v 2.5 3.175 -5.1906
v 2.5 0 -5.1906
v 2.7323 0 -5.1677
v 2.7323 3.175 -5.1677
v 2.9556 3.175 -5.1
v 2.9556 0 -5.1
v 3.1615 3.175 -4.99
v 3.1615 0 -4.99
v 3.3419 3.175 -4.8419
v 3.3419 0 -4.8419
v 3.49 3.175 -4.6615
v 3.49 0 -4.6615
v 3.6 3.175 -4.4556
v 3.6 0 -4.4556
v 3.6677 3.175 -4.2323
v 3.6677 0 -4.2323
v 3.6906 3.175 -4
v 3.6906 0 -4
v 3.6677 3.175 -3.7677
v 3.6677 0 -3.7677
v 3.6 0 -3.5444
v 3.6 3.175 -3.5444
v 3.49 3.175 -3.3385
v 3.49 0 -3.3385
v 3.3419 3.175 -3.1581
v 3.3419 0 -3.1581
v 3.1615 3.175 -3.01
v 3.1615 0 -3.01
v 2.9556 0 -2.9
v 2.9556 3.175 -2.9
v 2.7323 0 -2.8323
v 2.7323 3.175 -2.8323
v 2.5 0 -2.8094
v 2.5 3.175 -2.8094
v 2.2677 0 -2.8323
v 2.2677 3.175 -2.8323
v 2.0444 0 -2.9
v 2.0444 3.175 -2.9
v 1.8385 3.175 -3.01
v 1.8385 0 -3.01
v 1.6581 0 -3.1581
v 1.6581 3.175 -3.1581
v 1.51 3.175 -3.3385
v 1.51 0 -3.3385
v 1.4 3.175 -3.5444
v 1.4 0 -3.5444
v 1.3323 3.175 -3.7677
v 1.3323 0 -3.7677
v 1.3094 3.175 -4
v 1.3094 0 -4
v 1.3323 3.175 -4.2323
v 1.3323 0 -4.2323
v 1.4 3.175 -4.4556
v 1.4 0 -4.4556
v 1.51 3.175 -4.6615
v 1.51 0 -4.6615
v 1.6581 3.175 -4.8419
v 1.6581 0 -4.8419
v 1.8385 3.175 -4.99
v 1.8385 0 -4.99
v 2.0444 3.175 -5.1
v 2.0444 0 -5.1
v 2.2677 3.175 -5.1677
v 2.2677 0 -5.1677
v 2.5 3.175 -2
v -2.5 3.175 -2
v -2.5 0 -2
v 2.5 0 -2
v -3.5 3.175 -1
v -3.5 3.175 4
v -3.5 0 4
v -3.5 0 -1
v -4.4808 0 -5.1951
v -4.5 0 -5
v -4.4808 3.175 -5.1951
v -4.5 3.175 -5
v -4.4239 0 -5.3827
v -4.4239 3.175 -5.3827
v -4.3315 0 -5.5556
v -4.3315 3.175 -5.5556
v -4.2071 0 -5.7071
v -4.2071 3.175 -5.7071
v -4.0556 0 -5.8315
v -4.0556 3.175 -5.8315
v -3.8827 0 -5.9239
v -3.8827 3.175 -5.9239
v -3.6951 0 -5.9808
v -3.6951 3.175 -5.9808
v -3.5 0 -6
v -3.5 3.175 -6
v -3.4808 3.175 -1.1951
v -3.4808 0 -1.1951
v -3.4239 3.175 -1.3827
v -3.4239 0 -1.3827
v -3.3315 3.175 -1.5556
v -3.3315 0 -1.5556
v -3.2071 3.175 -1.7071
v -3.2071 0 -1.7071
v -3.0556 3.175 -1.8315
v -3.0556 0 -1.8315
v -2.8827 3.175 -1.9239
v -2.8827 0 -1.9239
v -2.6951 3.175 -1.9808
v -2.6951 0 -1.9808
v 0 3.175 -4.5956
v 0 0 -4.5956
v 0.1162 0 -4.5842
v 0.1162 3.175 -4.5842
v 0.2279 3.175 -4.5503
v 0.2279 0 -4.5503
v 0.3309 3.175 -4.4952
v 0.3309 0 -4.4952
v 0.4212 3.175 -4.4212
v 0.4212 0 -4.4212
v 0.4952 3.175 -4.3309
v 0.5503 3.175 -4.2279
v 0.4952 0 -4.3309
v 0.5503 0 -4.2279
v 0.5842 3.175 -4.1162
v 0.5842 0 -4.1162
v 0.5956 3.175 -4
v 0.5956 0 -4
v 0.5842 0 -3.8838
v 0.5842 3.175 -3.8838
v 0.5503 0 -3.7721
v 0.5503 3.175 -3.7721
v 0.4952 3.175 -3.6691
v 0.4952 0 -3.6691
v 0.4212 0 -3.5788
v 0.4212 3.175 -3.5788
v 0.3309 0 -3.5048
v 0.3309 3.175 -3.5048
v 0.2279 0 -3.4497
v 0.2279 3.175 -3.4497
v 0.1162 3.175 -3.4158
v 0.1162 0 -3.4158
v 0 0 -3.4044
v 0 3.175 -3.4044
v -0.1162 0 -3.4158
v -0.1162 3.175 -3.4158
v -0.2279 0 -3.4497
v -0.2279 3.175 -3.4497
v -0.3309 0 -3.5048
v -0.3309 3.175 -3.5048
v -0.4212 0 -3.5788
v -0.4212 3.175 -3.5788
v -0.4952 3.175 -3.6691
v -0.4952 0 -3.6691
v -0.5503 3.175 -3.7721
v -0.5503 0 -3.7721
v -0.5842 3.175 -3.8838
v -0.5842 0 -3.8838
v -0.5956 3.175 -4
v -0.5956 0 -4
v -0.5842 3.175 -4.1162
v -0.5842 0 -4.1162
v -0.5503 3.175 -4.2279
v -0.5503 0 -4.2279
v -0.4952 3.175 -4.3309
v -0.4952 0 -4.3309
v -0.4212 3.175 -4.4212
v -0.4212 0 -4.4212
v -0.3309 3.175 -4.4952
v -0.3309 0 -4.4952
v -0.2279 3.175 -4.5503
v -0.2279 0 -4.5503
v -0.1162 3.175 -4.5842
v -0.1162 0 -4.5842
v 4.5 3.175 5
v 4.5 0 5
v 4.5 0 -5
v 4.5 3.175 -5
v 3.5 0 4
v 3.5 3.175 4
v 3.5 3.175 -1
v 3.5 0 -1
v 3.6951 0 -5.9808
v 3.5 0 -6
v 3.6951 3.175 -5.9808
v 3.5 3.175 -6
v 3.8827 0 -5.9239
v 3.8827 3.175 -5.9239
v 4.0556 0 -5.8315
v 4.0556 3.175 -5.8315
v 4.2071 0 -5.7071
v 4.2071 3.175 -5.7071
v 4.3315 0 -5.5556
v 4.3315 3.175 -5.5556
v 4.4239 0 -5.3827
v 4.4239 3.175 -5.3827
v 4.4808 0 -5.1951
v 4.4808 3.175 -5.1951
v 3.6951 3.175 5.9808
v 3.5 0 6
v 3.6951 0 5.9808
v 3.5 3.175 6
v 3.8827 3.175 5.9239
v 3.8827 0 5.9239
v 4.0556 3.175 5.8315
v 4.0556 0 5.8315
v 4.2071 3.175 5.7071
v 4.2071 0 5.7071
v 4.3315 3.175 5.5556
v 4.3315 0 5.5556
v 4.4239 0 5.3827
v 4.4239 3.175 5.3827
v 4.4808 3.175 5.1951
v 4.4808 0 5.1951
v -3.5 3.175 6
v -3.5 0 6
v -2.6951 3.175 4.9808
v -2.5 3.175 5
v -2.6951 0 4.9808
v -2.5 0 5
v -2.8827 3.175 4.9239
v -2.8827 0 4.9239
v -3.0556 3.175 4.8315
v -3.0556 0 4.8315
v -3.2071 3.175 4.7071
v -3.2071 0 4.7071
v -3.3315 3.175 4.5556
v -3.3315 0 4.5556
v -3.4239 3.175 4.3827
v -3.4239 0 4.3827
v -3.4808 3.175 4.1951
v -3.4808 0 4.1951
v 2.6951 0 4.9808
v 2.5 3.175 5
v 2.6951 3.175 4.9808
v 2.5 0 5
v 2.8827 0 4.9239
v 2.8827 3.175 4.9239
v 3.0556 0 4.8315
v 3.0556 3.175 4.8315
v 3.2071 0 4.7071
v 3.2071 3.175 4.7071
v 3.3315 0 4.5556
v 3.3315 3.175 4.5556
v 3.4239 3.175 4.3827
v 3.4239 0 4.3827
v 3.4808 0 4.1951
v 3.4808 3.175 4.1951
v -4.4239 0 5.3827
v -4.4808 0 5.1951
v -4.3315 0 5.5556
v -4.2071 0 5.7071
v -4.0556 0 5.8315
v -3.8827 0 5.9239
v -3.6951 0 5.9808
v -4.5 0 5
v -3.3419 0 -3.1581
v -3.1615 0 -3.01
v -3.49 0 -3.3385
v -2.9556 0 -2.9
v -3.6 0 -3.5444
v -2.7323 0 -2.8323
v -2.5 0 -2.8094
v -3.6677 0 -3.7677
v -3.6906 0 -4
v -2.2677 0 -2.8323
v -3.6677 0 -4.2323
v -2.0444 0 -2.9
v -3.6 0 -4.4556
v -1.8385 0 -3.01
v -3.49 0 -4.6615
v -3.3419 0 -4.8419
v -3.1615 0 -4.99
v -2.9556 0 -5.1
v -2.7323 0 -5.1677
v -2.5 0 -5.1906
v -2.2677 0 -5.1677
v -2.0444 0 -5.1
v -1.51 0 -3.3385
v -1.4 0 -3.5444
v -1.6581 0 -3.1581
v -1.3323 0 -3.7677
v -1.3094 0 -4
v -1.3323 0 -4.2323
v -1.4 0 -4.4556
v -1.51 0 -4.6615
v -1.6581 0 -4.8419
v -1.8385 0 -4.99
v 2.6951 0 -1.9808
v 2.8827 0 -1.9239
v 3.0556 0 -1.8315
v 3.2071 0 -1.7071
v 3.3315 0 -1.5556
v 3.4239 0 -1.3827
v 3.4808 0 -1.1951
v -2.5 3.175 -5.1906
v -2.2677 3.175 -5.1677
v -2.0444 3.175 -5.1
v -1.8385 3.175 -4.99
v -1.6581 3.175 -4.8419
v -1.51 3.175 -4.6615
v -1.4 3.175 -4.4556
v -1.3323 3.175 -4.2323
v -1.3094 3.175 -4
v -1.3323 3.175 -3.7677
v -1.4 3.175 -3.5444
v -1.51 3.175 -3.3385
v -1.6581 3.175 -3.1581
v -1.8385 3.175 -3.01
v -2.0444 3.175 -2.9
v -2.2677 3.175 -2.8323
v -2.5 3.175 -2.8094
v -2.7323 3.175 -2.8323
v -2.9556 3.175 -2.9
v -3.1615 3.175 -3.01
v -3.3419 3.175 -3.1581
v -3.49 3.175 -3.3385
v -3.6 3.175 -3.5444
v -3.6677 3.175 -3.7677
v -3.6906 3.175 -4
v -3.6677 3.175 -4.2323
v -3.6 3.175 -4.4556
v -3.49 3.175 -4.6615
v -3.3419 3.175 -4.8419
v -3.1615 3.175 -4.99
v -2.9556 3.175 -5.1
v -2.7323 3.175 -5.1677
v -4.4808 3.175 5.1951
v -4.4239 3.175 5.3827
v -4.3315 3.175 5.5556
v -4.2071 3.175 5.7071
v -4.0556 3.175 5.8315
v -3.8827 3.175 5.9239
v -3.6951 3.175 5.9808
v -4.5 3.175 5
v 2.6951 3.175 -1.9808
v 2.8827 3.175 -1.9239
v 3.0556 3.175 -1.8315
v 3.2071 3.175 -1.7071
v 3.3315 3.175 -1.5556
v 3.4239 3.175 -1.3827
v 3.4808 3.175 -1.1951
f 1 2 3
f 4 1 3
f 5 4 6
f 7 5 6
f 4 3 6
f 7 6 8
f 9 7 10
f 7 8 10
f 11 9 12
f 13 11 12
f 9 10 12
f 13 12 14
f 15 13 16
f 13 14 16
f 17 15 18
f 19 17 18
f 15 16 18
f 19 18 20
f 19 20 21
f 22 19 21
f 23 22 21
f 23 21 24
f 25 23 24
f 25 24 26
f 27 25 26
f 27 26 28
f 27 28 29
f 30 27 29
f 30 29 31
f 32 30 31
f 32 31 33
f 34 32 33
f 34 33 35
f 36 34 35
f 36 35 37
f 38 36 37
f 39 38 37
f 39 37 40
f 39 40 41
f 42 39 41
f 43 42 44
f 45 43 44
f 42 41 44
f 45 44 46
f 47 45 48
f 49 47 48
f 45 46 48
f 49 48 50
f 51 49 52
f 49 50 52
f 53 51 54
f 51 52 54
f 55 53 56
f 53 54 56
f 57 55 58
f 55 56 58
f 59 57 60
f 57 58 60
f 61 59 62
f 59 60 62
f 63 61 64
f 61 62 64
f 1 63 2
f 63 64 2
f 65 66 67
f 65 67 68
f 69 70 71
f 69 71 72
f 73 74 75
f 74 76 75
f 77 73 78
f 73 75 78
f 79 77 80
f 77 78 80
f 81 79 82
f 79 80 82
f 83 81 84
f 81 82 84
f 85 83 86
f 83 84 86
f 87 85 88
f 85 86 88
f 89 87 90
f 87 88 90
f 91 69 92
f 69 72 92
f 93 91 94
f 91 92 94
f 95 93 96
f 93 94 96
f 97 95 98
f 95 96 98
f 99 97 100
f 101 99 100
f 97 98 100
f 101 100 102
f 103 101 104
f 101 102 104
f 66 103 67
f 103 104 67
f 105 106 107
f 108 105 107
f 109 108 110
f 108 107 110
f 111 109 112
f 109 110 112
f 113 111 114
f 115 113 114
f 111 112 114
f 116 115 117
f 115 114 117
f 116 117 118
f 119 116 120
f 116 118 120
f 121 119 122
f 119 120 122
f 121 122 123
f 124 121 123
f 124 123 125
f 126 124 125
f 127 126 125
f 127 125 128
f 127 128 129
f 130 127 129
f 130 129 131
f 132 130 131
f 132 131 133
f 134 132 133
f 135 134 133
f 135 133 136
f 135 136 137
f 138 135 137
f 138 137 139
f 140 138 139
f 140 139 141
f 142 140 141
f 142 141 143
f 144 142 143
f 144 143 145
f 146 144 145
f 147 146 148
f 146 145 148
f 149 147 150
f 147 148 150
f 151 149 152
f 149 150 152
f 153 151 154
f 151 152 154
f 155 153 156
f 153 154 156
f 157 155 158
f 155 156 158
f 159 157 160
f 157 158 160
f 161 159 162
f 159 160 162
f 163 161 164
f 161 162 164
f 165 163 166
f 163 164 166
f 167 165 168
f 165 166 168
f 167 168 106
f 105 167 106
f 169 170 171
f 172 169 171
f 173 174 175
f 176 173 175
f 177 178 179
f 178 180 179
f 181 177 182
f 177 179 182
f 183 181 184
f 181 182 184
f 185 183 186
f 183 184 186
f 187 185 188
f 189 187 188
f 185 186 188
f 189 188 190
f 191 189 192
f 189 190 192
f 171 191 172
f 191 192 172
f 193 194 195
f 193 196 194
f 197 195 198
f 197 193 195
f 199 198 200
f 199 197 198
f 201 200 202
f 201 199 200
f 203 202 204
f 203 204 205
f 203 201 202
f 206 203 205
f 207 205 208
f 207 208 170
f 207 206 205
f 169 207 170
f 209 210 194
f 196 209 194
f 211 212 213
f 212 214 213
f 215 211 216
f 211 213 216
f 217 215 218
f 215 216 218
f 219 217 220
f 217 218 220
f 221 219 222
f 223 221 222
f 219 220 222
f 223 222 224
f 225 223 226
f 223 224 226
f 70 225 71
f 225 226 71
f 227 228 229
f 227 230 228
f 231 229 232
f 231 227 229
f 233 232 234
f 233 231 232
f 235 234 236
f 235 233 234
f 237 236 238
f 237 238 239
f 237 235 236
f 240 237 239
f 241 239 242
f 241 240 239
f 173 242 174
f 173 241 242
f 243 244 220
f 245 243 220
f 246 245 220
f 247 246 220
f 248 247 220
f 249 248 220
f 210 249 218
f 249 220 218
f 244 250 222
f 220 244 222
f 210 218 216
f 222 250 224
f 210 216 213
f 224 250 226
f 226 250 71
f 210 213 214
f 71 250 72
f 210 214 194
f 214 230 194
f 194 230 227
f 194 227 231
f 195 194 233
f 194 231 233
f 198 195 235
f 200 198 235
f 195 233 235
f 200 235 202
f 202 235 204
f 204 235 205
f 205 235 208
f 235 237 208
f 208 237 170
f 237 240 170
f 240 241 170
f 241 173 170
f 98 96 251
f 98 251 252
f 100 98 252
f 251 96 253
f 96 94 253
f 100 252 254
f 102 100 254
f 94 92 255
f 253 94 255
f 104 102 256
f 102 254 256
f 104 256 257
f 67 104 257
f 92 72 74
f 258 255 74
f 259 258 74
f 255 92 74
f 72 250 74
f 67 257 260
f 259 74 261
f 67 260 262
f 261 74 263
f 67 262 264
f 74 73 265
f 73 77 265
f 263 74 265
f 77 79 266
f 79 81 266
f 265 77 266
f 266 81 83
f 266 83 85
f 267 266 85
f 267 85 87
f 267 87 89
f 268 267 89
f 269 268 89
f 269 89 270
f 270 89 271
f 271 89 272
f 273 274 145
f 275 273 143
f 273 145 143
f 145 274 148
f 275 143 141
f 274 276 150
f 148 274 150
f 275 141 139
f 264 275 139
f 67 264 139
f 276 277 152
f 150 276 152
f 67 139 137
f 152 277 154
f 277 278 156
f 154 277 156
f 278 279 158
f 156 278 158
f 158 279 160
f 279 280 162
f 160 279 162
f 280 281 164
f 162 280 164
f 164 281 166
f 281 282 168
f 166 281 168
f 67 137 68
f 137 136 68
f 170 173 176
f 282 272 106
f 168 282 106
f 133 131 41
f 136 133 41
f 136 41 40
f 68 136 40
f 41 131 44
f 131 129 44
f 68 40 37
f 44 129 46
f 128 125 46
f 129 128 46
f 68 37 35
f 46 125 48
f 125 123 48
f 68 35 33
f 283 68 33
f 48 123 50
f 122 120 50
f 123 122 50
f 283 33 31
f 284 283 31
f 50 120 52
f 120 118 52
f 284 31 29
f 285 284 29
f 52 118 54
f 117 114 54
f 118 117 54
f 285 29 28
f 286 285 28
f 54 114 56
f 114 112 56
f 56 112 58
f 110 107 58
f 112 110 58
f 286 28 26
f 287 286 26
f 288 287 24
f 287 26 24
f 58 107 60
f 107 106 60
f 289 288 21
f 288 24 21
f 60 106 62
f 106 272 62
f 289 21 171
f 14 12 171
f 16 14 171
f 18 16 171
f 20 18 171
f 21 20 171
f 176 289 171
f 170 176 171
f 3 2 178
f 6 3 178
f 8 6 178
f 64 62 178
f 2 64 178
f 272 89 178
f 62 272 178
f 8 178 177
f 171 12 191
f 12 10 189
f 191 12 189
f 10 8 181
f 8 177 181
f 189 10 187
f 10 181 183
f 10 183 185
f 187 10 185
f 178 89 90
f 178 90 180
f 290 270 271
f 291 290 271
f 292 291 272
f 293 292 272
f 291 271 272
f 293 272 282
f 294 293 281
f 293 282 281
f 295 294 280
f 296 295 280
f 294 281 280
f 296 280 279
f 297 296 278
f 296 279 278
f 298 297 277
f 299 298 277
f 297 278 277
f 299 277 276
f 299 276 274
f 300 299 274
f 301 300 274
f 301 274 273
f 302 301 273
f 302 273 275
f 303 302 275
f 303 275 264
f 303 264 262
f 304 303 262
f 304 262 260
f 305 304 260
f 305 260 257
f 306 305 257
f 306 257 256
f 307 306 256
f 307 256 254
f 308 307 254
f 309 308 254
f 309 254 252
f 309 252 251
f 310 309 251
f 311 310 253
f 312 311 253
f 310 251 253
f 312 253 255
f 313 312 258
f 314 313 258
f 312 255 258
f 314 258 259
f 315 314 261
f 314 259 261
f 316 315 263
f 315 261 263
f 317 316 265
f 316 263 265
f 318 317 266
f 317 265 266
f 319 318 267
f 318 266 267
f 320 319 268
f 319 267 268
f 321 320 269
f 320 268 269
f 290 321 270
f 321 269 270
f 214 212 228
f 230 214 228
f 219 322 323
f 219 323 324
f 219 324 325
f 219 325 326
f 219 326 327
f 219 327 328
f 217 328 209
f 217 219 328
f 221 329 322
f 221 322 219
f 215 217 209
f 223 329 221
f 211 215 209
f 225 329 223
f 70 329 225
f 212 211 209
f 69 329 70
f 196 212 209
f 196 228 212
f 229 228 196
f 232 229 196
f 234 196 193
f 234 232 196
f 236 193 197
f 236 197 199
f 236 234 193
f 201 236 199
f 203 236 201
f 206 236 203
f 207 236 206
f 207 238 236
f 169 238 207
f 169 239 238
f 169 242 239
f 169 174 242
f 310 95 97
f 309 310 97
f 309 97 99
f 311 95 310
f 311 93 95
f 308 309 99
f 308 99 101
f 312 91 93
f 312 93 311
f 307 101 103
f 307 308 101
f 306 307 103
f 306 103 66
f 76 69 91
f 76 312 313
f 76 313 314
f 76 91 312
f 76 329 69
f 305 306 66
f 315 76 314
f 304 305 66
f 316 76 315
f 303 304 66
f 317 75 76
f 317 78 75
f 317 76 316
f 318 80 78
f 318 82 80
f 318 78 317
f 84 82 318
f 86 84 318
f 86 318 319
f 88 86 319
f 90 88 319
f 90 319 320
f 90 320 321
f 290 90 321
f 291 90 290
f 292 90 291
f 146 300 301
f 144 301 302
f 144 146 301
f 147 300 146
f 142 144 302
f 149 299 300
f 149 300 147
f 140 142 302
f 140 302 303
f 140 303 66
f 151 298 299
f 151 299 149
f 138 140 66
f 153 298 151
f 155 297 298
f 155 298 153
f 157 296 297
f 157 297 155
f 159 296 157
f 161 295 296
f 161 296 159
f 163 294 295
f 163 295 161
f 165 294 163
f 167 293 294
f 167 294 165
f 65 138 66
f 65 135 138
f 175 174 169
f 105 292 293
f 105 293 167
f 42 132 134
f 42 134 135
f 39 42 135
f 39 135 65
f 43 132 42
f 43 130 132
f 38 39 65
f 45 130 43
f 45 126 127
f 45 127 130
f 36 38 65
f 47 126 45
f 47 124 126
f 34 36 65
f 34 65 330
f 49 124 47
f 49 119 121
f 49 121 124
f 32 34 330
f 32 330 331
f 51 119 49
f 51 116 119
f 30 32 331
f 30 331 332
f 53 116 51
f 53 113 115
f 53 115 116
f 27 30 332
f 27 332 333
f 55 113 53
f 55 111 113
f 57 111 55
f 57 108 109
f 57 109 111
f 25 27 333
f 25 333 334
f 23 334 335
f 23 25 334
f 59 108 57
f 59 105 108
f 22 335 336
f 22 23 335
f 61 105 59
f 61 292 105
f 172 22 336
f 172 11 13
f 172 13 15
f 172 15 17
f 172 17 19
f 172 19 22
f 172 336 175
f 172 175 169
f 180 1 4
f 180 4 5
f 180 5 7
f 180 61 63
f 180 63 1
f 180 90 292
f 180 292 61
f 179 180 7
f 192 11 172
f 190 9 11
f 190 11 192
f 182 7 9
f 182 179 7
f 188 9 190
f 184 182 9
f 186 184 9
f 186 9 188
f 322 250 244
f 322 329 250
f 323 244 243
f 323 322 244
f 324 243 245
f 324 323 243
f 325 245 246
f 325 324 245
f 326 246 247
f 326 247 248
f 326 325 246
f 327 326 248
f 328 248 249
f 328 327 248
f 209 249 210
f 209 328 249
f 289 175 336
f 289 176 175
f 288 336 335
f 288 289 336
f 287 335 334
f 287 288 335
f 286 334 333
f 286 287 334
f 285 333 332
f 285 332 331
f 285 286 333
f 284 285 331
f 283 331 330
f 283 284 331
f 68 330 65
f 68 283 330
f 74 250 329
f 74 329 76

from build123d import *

# Parameters (mm, degrees)
SKETCH1_W                           = 9
SKETCH1_H                           = 12
EXTRUDE1_DEPTH                      = 3.175
SKETCH2_W                           = 7
SKETCH2_H                           = 7
EXTRUDE2_DEPTH                      = 3.5
F_0_80_TAPPED_HOLE1_D               = 1.19126
F_0_80_TAPPED_HOLE1_DEPTH           = 4
F_0_80_TAPPED_HOLE1_TIP             = 0.357890611
F_3_32_0_09375_DIAMETER_HOLE1_D     = 2.38125
F_3_32_0_09375_DIAMETER_HOLE1_DEPTH = 10
F_3_32_0_09375_DIAMETER_HOLE1_TIP   = 0.715399675
FILLET7_R                           = 1


with BuildPart() as part:
    # Sketch1 → Extrude1 (new body)
    with BuildSketch(Plane(origin=(0, 0, 0), x_dir=(1, 0, 0), z_dir=(0, 1, 0))):
        Rectangle(SKETCH1_W, SKETCH1_H)
    extrude(amount=EXTRUDE1_DEPTH)

    # Sketch2 → Extrude2 (cut)
    with BuildSketch(Plane(origin=(0, 3.175, 0), x_dir=(1, 0, 0), z_dir=(0, 1, 0))):
        with Locations((0, -1.5)):
            Rectangle(SKETCH2_W, SKETCH2_H)
    extrude(amount=-EXTRUDE2_DEPTH, mode=Mode.SUBTRACT)

    # #0-80 Tapped Hole1
    with Locations(Plane(origin=(0, 3.175, -4), x_dir=(0, 0, 1), z_dir=(0, 1, 0))):
        with Locations((0, 0)):
            Hole(F_0_80_TAPPED_HOLE1_D / 2, depth=F_0_80_TAPPED_HOLE1_DEPTH)
            with Locations((0, 0, -(F_0_80_TAPPED_HOLE1_DEPTH + F_0_80_TAPPED_HOLE1_TIP / 2))):  # 118° drill point
                Cone(0, F_0_80_TAPPED_HOLE1_D / 2, F_0_80_TAPPED_HOLE1_TIP, mode=Mode.SUBTRACT)

    # 3/32 (0.09375) Diameter Hole1
    with Locations(Plane(origin=(-2.5, 3.175, -4), x_dir=(0, 0, 1), z_dir=(0, 1, 0))):
        with Locations((0, 0), (0, 5)):
            Hole(F_3_32_0_09375_DIAMETER_HOLE1_D / 2, depth=F_3_32_0_09375_DIAMETER_HOLE1_DEPTH)
            with Locations((0, 0, -(F_3_32_0_09375_DIAMETER_HOLE1_DEPTH + F_3_32_0_09375_DIAMETER_HOLE1_TIP / 2))):  # 118° drill point
                Cone(0, F_3_32_0_09375_DIAMETER_HOLE1_D / 2, F_3_32_0_09375_DIAMETER_HOLE1_TIP, mode=Mode.SUBTRACT)

    # Fillet7
    fillet7_edges = [part.edges().sort_by_distance(p)[0] for p in [
        (-3.5, 1.5875, 5),
        (-3.5, 1.5875, -2),
        (3.5, 1.5875, -2),
        (3.5, 1.5875, 5),
        (-4.5, 1.5875, -6),
        (4.5, 1.5875, -6),
        (4.5, 1.5875, 6),
        (-4.5, 1.5875, 6),
    ]]
    fillet(fillet7_edges, radius=FILLET7_R)


solid = part.part
